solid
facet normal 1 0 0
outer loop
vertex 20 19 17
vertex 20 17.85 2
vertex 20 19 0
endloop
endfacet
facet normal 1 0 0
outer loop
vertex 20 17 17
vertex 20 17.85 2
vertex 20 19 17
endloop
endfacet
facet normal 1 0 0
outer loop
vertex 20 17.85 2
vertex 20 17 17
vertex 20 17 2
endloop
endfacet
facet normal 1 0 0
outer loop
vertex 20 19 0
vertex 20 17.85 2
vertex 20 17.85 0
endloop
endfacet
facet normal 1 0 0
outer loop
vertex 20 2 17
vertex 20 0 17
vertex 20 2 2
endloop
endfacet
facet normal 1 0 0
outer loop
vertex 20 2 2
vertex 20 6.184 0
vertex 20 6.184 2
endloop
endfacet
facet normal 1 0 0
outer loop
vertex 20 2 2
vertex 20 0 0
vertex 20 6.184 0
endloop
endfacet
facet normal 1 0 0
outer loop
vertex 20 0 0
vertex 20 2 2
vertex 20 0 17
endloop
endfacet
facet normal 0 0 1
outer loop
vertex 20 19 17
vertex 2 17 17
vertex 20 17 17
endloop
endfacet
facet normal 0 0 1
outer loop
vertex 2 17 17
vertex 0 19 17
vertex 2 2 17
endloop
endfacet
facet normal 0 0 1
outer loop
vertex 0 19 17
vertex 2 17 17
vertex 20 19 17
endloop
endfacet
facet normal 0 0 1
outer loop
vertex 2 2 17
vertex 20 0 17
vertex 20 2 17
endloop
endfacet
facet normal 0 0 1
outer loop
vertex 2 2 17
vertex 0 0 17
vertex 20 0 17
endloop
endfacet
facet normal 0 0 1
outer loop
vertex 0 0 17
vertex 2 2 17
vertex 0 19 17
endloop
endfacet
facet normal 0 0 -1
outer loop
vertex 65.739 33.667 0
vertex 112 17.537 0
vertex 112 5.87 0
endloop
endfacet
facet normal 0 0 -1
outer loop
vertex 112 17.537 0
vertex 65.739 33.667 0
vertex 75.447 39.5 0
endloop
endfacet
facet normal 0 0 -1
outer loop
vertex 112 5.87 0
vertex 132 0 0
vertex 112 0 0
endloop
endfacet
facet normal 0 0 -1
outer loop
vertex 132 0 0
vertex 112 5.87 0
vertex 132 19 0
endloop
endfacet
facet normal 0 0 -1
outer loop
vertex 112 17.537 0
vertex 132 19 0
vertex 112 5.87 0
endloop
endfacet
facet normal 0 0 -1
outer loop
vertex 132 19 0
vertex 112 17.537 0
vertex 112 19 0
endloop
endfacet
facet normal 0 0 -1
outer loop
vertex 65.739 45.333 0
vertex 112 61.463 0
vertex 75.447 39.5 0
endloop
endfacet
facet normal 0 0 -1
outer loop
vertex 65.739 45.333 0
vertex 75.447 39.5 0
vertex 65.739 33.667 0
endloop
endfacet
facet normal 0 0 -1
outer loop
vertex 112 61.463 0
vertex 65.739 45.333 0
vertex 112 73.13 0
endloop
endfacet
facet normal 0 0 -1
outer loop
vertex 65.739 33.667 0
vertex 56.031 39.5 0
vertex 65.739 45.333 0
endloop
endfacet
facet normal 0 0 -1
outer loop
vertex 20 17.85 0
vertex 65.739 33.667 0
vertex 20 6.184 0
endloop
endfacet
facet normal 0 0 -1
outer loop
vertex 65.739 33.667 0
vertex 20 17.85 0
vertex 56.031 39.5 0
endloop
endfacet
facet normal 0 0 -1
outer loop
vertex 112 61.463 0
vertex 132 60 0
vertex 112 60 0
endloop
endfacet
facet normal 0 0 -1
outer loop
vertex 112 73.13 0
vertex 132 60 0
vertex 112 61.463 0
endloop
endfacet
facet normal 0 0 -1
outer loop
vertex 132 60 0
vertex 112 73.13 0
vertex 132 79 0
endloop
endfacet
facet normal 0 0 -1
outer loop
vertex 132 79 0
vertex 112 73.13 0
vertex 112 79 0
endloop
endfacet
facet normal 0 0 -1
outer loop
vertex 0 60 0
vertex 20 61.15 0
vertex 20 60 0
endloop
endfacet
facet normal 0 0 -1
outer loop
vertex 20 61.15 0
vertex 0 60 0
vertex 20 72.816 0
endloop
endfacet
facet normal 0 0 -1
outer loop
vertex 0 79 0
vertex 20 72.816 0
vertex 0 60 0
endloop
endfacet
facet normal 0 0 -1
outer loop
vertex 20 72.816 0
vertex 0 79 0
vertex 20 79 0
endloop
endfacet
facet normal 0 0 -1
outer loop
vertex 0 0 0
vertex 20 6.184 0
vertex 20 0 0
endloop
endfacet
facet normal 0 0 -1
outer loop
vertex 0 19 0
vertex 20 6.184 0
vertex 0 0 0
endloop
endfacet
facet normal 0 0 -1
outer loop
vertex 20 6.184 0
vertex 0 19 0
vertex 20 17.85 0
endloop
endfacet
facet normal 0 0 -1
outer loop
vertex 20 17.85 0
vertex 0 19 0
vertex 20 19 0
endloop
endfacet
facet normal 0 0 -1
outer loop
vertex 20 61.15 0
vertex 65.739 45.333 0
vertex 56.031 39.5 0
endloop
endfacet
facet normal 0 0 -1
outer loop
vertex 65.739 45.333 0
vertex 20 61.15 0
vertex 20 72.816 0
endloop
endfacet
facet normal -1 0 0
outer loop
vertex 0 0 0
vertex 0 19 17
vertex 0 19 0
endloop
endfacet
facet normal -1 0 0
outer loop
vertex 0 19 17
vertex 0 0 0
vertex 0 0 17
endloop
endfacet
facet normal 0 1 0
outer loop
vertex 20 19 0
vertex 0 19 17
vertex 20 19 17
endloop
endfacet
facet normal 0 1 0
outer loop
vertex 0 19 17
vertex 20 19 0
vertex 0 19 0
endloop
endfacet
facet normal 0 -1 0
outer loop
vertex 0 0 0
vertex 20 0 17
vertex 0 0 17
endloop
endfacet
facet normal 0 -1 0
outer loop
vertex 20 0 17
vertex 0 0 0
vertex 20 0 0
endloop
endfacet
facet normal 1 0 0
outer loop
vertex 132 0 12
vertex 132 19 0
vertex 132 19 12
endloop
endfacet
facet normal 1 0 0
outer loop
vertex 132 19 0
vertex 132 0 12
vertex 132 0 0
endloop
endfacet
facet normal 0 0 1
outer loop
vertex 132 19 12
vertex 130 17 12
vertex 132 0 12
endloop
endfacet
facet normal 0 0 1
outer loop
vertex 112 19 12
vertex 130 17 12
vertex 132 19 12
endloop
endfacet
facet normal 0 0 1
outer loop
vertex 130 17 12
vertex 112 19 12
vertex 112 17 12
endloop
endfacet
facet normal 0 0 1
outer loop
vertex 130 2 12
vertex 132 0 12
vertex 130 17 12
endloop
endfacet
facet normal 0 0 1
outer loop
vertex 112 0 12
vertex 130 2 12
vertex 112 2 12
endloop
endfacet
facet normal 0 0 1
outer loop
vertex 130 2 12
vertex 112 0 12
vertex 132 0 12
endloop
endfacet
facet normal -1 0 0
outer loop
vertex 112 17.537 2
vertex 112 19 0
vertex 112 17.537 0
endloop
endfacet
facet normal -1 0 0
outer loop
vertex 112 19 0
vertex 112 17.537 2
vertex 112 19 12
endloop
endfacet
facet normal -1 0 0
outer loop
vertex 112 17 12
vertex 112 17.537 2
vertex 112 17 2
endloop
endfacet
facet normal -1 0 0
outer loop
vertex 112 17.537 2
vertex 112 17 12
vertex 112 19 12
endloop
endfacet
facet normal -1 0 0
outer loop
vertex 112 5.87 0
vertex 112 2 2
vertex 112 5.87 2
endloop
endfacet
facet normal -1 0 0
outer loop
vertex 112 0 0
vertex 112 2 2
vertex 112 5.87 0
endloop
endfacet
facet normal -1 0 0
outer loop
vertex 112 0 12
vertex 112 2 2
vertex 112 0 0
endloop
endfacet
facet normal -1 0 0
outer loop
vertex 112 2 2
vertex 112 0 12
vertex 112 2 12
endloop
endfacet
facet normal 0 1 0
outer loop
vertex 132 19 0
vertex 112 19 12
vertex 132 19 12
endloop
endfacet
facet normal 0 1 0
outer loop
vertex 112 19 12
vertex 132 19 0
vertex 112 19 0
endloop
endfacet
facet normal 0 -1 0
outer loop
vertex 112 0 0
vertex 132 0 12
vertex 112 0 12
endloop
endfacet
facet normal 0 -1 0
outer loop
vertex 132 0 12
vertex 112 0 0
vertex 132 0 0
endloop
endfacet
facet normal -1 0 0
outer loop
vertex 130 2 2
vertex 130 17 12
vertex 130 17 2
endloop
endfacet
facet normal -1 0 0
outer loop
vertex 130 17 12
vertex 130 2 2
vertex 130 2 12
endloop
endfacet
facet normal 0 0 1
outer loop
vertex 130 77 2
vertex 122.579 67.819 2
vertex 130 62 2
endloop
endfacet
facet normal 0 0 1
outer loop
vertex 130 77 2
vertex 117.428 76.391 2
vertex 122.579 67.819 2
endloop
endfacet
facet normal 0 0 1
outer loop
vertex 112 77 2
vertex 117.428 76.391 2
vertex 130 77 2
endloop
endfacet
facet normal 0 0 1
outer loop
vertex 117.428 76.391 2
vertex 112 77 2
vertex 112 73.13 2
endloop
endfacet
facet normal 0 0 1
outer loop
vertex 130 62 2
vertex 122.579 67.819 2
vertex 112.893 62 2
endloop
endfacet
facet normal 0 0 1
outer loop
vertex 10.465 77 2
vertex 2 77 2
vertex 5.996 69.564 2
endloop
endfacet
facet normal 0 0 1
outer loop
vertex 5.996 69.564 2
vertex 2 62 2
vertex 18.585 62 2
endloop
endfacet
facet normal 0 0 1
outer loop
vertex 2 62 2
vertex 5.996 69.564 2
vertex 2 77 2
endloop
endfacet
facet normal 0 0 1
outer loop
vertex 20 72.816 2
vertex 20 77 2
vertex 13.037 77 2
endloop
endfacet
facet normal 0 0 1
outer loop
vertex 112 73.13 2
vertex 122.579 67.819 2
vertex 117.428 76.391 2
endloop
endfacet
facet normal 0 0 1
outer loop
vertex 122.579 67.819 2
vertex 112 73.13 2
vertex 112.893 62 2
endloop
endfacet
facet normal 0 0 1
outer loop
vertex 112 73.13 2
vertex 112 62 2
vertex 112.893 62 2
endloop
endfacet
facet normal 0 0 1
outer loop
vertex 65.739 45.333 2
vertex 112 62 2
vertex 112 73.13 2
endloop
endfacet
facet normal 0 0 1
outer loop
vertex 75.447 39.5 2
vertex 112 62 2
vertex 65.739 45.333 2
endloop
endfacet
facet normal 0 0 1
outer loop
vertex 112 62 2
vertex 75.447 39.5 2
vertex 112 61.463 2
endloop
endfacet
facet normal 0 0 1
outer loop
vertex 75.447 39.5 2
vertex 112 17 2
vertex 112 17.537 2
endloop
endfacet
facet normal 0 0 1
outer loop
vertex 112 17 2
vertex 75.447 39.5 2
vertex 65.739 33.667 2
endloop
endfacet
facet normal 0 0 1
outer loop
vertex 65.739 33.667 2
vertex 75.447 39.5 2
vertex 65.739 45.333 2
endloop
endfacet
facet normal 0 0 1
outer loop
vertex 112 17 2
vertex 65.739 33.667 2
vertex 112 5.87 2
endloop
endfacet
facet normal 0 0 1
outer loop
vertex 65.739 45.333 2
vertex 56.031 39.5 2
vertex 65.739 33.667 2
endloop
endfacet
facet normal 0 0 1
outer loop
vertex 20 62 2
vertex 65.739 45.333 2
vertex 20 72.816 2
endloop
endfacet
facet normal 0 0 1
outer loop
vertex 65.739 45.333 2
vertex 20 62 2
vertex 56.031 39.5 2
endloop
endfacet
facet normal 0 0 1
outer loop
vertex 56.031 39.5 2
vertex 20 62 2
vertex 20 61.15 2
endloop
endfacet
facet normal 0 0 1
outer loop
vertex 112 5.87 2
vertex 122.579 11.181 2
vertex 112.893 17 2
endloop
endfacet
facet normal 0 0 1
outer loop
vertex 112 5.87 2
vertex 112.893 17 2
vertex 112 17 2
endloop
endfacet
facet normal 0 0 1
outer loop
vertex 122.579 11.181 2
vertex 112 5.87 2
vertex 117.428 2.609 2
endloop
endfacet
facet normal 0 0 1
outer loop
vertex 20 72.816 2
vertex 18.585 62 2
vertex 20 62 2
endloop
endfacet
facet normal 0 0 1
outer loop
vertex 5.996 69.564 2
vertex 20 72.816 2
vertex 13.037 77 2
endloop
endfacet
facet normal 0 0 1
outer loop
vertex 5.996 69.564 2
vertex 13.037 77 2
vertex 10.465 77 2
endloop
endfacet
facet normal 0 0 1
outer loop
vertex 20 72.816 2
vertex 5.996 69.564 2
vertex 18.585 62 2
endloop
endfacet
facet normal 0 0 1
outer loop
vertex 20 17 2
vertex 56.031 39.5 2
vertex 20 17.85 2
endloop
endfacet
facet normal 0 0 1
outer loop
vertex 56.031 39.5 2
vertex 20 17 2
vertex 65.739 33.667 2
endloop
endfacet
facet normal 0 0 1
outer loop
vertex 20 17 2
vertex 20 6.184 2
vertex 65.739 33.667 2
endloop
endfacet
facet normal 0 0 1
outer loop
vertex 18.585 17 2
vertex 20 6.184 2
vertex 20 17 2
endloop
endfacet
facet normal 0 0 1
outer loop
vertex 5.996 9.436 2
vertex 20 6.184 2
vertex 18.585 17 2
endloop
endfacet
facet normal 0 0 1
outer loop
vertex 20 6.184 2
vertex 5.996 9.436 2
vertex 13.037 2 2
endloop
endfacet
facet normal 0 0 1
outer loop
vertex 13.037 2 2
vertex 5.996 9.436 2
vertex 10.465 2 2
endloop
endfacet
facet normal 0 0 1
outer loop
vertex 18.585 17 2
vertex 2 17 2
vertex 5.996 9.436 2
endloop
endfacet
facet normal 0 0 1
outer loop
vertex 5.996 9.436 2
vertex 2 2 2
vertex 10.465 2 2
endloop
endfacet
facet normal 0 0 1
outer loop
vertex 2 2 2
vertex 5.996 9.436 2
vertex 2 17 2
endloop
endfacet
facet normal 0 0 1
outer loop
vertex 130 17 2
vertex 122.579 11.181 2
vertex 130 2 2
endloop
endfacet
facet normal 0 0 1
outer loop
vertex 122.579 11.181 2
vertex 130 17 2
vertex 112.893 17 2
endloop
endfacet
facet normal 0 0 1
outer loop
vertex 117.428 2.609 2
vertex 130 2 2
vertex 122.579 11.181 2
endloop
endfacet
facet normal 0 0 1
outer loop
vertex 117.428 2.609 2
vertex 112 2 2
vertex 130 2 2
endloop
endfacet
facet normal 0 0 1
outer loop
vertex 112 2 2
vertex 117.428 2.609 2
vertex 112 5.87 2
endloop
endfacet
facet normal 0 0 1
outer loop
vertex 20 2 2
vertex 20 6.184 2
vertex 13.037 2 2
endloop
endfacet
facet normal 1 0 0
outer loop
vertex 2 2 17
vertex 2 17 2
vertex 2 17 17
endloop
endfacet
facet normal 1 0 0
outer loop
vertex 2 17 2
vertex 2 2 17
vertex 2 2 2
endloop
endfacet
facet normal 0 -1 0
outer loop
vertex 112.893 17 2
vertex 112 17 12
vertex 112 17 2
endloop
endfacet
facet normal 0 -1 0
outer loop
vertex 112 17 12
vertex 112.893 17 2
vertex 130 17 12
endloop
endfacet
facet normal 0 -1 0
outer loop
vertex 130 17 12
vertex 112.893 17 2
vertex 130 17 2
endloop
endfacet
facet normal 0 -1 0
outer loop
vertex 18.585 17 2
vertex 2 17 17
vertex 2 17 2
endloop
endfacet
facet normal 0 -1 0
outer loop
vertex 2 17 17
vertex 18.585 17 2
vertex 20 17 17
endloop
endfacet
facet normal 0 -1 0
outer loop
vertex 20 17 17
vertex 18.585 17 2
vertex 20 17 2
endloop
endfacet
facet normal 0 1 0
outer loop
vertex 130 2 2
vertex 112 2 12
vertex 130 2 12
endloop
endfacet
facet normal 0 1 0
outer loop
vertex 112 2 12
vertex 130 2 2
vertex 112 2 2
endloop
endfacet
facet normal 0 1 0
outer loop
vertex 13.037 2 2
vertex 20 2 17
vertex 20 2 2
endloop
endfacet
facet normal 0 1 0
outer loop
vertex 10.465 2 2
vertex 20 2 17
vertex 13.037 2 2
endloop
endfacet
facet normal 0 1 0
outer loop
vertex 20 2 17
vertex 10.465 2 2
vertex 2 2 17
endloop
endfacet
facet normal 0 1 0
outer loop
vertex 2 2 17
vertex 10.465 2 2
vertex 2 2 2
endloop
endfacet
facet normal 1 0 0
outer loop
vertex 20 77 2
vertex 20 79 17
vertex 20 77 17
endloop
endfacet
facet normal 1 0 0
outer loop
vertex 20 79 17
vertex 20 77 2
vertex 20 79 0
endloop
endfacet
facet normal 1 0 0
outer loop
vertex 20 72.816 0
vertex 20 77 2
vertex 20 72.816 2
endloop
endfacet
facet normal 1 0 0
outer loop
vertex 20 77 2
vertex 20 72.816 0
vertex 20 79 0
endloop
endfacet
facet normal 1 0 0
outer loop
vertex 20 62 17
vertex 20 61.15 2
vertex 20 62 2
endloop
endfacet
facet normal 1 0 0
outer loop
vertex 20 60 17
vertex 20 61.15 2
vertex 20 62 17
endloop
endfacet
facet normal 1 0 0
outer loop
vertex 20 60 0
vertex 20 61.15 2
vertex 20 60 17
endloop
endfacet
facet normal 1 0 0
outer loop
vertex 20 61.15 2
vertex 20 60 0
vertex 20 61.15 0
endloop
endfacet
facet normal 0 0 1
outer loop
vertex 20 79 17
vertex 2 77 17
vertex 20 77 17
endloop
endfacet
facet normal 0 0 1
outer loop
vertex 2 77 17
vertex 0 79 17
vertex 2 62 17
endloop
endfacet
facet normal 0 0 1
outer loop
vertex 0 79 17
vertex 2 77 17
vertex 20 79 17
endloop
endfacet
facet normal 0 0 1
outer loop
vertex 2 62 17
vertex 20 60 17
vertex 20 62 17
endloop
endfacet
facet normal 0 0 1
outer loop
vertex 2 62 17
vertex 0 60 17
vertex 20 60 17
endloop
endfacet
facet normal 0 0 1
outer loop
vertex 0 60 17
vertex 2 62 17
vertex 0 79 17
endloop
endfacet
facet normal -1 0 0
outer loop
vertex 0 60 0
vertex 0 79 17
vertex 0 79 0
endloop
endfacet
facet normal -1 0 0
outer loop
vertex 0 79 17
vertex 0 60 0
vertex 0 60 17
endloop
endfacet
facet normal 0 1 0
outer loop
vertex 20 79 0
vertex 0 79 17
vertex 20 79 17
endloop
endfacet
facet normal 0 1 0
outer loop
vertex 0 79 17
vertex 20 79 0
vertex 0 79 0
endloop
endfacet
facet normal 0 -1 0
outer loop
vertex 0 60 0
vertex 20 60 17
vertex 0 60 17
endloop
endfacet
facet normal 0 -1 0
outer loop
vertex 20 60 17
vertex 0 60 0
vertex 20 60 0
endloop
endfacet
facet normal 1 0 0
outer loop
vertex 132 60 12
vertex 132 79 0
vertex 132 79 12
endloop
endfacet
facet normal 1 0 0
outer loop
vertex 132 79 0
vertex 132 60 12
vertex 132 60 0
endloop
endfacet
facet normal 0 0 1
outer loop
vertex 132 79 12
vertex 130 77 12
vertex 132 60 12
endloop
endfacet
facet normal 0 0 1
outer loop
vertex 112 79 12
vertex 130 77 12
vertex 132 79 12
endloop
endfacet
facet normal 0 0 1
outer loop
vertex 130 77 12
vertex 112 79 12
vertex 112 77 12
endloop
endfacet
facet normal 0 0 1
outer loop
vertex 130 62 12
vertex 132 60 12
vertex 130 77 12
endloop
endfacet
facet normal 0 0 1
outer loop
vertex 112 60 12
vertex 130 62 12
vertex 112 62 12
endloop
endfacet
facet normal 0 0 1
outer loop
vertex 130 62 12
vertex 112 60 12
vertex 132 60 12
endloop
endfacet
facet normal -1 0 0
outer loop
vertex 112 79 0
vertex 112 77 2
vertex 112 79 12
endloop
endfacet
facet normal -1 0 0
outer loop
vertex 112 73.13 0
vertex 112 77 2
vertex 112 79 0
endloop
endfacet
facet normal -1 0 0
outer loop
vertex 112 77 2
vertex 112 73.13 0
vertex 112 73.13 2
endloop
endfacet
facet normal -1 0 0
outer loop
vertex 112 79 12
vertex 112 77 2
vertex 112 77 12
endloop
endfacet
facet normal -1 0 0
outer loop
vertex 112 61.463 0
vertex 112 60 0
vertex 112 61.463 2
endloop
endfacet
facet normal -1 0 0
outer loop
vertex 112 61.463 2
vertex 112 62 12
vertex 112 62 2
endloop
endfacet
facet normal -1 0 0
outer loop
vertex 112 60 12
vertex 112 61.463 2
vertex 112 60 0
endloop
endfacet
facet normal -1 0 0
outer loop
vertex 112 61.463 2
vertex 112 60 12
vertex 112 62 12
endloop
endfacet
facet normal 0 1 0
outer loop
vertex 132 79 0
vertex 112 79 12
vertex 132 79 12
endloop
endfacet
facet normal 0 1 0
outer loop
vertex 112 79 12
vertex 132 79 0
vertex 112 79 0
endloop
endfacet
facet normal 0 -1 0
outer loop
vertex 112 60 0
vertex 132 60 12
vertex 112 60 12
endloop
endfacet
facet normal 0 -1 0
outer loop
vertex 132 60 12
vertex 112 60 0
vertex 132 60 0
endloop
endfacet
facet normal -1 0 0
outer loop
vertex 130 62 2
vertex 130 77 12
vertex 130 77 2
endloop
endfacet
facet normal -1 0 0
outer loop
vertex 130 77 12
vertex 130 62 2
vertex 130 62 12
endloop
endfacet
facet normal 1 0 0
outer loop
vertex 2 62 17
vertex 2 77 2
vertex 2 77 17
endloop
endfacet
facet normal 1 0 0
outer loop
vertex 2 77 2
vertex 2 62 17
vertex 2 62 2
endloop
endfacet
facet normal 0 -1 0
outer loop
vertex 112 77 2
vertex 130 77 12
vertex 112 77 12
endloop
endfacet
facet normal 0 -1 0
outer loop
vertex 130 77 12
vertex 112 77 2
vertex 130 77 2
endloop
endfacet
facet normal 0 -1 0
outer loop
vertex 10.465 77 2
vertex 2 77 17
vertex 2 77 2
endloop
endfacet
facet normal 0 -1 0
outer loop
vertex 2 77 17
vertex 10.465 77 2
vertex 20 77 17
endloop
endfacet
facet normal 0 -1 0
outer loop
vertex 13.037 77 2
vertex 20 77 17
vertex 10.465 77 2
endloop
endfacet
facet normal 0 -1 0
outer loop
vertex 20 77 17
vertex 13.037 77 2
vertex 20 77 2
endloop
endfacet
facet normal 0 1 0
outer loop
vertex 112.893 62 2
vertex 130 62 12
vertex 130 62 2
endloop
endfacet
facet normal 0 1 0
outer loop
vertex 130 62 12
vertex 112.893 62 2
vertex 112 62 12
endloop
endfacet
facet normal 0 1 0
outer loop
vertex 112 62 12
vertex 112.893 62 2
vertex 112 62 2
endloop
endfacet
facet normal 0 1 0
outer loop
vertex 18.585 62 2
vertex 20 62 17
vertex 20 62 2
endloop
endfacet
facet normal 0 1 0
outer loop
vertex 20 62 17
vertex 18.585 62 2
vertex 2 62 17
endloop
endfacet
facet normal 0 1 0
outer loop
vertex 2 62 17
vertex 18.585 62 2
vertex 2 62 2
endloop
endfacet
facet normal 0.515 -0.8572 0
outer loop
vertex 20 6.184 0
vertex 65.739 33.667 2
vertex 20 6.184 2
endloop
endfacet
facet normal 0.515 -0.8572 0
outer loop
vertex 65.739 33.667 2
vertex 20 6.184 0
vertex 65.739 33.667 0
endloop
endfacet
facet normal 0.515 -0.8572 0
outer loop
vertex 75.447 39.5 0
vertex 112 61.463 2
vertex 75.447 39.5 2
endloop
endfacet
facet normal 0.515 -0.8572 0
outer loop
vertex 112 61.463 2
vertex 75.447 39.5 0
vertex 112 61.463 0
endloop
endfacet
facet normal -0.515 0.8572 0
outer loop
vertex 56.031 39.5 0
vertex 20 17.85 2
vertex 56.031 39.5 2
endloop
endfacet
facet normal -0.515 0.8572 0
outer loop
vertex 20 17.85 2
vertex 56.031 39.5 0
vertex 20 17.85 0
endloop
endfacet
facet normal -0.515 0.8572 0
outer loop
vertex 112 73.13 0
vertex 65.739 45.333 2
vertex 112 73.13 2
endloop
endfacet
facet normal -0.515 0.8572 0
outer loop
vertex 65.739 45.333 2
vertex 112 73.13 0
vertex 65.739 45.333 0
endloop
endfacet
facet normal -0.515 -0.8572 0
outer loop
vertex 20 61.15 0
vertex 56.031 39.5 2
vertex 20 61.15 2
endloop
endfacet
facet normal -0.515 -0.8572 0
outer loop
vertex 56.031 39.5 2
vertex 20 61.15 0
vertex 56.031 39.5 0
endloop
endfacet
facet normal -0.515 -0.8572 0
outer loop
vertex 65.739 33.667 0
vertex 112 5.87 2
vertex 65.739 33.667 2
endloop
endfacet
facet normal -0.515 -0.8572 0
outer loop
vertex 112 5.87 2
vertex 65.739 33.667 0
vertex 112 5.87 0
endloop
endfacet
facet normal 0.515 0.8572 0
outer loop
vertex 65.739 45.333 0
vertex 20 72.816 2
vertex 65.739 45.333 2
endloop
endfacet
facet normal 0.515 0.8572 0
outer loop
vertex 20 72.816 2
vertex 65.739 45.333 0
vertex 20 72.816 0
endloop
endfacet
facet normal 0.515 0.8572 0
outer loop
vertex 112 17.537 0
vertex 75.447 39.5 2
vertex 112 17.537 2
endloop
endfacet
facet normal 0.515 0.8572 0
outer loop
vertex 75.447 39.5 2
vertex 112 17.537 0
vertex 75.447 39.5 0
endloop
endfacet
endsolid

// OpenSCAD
side();
translate([0,60,0]) side();

rotate([0,0,-59]) translate([-5,10,0]) cube([10,130,2]);
translate([0,79,0]) mirror([0,1,0]) rotate([0,0,-59]) translate([-5,10,0]) cube([10,130,2]);

module side() {
  difference() {
    union() {
      cube([20,19,17]);
      translate([112,0,0]) cube([20,19,12]);
    }
    translate([2,2,2]) cube([128,15,20]);
  }
}
